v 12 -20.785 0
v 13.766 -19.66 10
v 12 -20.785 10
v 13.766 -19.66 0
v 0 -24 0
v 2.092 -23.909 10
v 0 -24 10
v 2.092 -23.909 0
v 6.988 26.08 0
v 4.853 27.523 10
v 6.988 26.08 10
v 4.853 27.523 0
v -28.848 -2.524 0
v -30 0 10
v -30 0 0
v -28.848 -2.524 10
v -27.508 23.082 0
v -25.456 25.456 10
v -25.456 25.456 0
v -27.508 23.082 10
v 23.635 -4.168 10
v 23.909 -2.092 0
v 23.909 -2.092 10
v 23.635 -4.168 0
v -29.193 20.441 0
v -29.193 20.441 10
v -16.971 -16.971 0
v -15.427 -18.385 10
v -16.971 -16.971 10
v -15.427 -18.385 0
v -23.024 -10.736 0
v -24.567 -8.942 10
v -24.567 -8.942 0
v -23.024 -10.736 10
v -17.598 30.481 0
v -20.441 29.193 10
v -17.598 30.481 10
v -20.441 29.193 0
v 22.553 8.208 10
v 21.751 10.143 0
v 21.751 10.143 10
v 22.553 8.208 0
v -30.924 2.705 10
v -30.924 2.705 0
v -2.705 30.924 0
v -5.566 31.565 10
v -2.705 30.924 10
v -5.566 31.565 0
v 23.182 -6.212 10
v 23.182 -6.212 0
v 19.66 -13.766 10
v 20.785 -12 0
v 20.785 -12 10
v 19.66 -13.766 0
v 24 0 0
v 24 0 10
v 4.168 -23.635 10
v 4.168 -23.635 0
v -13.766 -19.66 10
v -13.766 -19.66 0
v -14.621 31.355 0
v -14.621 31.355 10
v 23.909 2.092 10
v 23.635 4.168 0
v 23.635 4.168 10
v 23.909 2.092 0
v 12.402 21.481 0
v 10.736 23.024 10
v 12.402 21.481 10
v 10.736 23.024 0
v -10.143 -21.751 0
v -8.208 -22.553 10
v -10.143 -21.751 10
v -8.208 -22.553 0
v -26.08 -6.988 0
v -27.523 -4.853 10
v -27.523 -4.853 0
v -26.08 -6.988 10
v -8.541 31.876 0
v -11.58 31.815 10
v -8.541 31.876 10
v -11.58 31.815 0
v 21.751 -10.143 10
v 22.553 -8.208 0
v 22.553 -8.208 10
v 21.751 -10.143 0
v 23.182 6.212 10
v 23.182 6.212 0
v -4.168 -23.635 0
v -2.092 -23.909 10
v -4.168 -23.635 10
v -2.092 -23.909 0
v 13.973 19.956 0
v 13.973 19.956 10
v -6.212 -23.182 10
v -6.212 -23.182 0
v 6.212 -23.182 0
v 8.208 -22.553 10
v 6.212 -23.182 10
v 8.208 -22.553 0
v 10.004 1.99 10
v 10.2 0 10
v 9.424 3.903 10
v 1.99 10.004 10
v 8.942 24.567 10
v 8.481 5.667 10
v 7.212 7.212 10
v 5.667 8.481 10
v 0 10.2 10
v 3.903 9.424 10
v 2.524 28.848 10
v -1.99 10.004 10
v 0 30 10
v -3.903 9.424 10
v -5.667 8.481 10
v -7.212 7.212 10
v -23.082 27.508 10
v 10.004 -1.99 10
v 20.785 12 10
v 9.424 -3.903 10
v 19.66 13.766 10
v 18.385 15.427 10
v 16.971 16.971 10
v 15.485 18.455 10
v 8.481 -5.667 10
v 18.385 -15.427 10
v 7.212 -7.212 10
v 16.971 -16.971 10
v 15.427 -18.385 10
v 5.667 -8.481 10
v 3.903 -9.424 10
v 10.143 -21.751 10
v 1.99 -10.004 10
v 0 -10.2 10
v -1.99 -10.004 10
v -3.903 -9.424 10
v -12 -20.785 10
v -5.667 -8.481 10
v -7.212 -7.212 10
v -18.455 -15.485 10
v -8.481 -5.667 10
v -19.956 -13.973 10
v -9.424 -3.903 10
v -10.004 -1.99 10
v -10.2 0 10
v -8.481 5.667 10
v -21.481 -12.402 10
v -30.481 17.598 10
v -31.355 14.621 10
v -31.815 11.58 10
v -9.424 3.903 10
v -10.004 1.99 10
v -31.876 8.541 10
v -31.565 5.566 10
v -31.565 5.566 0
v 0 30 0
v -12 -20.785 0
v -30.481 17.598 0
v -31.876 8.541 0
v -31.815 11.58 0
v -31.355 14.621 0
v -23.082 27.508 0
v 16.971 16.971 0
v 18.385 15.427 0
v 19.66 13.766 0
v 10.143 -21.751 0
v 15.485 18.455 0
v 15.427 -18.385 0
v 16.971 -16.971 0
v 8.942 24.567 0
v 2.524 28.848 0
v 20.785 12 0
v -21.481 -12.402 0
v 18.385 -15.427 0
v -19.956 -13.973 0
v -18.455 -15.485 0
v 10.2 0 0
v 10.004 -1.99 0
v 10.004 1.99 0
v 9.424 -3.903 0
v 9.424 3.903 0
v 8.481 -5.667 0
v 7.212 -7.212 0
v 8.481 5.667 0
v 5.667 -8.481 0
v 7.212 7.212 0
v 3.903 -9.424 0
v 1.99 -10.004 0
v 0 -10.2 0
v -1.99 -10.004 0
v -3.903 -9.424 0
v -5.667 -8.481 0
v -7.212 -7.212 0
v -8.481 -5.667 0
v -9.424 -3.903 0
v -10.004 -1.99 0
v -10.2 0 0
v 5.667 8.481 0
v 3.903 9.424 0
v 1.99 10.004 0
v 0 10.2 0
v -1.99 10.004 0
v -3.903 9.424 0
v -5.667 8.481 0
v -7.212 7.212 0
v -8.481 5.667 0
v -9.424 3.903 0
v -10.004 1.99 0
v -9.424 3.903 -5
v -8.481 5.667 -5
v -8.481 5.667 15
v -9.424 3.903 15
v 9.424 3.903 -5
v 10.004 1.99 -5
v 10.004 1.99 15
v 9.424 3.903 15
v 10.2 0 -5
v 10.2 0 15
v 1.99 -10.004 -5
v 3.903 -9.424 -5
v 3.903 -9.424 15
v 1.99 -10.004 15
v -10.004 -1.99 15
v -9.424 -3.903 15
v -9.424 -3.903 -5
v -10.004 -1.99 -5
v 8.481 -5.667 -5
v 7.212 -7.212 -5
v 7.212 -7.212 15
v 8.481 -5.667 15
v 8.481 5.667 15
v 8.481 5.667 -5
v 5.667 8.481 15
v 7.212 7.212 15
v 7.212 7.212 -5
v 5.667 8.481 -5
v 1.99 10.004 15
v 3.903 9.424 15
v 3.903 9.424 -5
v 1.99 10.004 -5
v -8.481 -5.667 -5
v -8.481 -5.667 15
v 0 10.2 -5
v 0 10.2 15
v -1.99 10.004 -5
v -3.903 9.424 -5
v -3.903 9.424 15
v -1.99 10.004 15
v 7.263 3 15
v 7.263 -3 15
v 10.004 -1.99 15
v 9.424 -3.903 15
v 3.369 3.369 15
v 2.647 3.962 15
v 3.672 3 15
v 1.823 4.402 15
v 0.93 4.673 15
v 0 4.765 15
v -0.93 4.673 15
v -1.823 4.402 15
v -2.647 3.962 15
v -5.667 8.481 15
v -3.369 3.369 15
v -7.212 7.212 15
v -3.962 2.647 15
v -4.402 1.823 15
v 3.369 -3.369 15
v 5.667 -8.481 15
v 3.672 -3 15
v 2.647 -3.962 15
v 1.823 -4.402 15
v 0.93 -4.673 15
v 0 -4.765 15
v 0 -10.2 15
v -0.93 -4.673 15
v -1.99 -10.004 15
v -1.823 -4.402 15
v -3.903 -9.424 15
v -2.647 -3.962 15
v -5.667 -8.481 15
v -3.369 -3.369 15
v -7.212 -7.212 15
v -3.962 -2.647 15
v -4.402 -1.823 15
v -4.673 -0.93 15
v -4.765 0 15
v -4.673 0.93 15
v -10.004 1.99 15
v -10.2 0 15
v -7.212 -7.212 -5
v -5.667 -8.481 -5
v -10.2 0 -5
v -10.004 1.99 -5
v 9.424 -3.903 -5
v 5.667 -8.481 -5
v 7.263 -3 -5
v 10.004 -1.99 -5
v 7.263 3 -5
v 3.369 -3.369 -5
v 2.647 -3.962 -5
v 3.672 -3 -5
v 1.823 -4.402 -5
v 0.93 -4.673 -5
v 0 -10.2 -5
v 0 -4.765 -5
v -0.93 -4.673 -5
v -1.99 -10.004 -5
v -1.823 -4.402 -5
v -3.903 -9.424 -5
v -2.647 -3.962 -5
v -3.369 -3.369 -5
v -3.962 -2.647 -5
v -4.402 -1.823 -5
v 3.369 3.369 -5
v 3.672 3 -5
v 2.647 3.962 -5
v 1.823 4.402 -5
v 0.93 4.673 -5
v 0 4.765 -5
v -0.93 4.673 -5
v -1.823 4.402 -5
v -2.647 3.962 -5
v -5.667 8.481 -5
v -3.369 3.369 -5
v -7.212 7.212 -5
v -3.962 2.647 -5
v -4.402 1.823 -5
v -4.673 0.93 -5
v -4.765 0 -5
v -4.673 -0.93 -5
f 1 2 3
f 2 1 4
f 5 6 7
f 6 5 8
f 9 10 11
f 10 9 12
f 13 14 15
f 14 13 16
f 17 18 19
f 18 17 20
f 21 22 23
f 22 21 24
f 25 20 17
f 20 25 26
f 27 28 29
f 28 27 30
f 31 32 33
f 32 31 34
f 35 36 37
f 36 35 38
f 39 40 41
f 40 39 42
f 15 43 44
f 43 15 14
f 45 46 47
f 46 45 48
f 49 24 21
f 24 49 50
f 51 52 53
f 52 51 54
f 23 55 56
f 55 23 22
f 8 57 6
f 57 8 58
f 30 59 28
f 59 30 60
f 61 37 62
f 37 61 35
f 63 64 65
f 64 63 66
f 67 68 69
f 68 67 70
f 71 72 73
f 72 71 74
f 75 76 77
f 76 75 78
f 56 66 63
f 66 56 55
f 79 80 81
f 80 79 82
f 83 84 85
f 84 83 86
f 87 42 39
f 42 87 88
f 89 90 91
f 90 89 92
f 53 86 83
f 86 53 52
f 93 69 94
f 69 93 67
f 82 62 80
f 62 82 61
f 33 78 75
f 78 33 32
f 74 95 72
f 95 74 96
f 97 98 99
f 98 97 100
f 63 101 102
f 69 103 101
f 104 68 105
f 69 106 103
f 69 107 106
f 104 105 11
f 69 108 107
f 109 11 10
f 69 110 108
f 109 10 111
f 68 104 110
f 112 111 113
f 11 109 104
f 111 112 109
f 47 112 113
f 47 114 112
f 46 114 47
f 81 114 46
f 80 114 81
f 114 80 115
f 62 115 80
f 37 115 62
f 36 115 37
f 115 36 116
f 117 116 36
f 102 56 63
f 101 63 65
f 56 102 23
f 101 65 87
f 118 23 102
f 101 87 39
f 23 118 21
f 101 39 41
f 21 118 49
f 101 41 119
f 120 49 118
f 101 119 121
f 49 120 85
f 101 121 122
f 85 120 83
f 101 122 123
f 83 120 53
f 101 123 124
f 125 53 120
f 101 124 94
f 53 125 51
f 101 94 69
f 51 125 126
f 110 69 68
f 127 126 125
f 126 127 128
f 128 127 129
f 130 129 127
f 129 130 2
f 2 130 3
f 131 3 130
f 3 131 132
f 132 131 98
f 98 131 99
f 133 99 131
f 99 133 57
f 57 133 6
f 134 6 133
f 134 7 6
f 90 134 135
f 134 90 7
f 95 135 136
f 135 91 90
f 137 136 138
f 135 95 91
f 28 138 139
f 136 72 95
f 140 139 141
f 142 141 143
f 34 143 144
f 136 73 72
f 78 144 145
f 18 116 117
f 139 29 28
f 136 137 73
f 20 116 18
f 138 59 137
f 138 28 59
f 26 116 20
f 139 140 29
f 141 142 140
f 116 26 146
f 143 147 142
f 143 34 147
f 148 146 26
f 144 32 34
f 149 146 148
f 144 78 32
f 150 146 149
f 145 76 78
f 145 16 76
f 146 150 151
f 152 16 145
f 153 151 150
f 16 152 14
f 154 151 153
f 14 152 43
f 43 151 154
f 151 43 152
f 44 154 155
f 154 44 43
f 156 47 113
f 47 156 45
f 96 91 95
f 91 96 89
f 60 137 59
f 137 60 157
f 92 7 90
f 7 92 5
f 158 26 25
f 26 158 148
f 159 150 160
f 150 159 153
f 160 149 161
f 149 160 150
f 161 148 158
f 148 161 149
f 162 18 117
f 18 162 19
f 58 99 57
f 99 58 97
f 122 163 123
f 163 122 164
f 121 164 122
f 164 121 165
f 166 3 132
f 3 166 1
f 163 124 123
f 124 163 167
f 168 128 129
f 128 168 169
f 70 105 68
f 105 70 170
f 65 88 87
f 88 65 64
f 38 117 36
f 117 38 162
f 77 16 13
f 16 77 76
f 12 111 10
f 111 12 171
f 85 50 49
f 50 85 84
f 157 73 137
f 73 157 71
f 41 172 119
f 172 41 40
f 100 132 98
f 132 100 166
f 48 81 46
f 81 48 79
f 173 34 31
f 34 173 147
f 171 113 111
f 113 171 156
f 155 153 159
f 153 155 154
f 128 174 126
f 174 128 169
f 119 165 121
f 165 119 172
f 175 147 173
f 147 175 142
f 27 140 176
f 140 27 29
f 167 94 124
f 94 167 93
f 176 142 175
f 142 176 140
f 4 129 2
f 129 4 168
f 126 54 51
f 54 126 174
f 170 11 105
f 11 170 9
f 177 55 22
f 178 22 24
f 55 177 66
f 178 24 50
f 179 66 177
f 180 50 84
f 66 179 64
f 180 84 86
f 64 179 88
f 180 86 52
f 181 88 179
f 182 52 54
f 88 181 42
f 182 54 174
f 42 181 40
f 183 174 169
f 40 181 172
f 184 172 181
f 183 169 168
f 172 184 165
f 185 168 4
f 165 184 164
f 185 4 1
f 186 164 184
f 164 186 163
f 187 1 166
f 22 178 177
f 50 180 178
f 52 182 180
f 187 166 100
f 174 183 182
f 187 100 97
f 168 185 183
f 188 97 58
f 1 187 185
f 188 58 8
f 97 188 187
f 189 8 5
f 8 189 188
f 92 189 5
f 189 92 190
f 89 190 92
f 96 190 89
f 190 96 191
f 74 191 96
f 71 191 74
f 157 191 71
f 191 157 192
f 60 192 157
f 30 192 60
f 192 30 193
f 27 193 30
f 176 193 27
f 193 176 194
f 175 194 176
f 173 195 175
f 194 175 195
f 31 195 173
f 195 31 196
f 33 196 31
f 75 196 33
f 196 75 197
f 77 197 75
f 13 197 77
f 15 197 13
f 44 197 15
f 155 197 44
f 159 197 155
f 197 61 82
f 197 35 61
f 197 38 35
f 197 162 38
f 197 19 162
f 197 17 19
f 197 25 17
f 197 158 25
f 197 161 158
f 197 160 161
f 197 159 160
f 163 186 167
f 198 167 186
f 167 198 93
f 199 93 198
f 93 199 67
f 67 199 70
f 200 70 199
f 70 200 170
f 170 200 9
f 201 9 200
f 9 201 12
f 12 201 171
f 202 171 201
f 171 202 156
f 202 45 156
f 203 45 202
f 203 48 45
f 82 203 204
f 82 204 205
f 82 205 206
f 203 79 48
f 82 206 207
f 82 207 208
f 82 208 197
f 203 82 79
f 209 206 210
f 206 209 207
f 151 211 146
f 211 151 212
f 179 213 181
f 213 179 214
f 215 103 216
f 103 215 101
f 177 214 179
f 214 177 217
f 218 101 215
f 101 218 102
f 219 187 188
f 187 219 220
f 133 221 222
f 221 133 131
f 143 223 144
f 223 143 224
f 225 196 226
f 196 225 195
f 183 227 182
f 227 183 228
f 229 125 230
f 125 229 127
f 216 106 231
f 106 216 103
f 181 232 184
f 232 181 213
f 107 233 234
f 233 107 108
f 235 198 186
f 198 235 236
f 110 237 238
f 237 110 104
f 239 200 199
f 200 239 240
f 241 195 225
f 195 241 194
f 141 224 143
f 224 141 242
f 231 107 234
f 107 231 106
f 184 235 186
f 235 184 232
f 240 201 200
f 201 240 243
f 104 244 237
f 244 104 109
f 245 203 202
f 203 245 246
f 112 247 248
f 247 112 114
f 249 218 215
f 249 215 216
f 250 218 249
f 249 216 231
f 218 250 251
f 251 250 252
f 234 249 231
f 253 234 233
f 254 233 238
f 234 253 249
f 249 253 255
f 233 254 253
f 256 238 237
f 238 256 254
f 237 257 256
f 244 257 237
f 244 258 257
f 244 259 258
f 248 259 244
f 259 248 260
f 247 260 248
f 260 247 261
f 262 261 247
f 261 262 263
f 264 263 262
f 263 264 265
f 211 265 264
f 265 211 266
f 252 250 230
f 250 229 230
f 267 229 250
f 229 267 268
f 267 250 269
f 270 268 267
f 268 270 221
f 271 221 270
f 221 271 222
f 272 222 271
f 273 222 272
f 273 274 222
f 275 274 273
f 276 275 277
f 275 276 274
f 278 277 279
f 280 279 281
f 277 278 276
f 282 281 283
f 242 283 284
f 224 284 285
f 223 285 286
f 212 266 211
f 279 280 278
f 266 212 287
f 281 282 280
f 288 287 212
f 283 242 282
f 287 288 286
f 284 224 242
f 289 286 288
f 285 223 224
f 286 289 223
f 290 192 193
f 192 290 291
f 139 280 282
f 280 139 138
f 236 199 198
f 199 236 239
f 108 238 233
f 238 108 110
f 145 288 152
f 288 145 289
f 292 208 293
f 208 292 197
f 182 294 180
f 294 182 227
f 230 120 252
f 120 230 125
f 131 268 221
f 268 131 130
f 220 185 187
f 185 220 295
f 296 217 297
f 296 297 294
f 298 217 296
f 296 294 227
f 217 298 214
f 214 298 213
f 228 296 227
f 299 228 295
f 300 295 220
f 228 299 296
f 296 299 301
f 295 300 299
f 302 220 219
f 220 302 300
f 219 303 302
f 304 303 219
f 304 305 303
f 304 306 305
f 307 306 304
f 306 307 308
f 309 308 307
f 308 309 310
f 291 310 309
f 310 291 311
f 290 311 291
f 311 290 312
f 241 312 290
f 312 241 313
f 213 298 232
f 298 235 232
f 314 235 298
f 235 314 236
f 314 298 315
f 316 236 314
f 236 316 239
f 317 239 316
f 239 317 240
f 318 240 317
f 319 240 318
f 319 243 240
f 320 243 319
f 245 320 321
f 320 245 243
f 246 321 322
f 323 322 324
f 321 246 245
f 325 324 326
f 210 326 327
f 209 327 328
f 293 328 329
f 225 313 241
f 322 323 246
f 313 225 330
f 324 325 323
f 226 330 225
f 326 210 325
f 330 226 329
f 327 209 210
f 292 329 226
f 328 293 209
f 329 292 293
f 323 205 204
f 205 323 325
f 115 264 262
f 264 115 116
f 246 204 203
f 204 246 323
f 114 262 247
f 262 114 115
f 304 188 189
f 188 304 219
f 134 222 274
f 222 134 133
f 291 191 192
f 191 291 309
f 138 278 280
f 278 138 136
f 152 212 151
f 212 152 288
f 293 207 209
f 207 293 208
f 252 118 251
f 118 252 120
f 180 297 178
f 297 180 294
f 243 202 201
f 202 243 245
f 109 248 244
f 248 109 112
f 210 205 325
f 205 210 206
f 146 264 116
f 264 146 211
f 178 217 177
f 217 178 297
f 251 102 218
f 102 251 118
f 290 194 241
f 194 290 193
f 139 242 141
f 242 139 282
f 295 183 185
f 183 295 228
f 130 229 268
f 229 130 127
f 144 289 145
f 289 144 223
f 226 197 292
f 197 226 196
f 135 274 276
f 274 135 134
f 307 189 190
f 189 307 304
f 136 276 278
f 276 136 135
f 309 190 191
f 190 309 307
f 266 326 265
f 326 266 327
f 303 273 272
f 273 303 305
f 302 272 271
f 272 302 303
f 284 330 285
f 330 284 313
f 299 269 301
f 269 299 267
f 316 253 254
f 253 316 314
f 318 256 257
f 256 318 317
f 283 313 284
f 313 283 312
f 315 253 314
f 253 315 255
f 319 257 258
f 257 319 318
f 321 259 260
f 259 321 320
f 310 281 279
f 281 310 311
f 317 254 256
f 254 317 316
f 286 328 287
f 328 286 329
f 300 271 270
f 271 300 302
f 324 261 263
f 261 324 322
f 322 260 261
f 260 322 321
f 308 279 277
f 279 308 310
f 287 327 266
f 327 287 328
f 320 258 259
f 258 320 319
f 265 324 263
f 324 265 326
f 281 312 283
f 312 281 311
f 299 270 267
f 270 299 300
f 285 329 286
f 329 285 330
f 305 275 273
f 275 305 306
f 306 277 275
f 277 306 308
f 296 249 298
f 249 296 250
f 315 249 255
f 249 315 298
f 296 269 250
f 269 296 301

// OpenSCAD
$fn = 32;

// ----------------------------------------------------------------------
// Cam: base radius 24 mm with a 12 mm lift over 180 degrees
// ----------------------------------------------------------------------

// --- parameters (mm) ---
base_r = 24;              // base radius
lift = 12;                // lift height above the base radius
lift_span = 180;          // angular width of the lift
lift_start = 45;          // angle where the lift starts
cam_t = 10;               // cam plate thickness
hub_d = 20.4;             // hub diameter
hub_h = 20;               // hub height
bore_d = 9.53;            // bore
key_w = 6;                // keyway width
key_depth = 3;            // keyway depth

cam_profile = [[24, 0], [23.909, 2.092], [23.635, 4.168], [23.182, 6.212], [22.553, 8.208], [21.751, 10.143], [20.785, 12], [19.66, 13.766], [18.385, 15.427], [16.971, 16.971], [15.485, 18.455], [13.973, 19.956], [12.402, 21.481], [10.736, 23.024], [8.942, 24.567], [6.988, 26.08], [4.853, 27.523], [2.524, 28.848], [0, 30], [-2.705, 30.924], [-5.566, 31.565], [-8.541, 31.876], [-11.58, 31.815], [-14.621, 31.355], [-17.598, 30.481], [-20.441, 29.193], [-23.082, 27.508], [-25.456, 25.456], [-27.508, 23.082], [-29.193, 20.441], [-30.481, 17.598], [-31.355, 14.621], [-31.815, 11.58], [-31.876, 8.541], [-31.565, 5.566], [-30.924, 2.705], [-30, 0], [-28.848, -2.524], [-27.523, -4.853], [-26.08, -6.988], [-24.567, -8.942], [-23.024, -10.736], [-21.481, -12.402], [-19.956, -13.973], [-18.455, -15.485], [-16.971, -16.971], [-15.427, -18.385], [-13.766, -19.66], [-12, -20.785], [-10.143, -21.751], [-8.208, -22.553], [-6.212, -23.182], [-4.168, -23.635], [-2.092, -23.909], [0, -24], [2.092, -23.909], [4.168, -23.635], [6.212, -23.182], [8.208, -22.553], [10.143, -21.751], [12, -20.785], [13.766, -19.66], [15.427, -18.385], [16.971, -16.971], [18.385, -15.427], [19.66, -13.766], [20.785, -12], [21.751, -10.143], [22.553, -8.208], [23.182, -6.212], [23.635, -4.168], [23.909, -2.092]];

difference() {
  union() {
    linear_extrude(height = cam_t) polygon(cam_profile);
    /* hub, proud of the cam plate on both sides */
    translate([0, 0, -5]) cylinder(h = hub_h, d = hub_d);
  }
  /* bore through the hub, 2.5 mm clear on both faces */
  translate([0, 0, -7.5]) cylinder(h = hub_h + 5, d = bore_d);
  /* keyway, milled through the whole hub */
  translate([1.763, -3, -7.5]) cube([5.5, 6, 25]);
}
